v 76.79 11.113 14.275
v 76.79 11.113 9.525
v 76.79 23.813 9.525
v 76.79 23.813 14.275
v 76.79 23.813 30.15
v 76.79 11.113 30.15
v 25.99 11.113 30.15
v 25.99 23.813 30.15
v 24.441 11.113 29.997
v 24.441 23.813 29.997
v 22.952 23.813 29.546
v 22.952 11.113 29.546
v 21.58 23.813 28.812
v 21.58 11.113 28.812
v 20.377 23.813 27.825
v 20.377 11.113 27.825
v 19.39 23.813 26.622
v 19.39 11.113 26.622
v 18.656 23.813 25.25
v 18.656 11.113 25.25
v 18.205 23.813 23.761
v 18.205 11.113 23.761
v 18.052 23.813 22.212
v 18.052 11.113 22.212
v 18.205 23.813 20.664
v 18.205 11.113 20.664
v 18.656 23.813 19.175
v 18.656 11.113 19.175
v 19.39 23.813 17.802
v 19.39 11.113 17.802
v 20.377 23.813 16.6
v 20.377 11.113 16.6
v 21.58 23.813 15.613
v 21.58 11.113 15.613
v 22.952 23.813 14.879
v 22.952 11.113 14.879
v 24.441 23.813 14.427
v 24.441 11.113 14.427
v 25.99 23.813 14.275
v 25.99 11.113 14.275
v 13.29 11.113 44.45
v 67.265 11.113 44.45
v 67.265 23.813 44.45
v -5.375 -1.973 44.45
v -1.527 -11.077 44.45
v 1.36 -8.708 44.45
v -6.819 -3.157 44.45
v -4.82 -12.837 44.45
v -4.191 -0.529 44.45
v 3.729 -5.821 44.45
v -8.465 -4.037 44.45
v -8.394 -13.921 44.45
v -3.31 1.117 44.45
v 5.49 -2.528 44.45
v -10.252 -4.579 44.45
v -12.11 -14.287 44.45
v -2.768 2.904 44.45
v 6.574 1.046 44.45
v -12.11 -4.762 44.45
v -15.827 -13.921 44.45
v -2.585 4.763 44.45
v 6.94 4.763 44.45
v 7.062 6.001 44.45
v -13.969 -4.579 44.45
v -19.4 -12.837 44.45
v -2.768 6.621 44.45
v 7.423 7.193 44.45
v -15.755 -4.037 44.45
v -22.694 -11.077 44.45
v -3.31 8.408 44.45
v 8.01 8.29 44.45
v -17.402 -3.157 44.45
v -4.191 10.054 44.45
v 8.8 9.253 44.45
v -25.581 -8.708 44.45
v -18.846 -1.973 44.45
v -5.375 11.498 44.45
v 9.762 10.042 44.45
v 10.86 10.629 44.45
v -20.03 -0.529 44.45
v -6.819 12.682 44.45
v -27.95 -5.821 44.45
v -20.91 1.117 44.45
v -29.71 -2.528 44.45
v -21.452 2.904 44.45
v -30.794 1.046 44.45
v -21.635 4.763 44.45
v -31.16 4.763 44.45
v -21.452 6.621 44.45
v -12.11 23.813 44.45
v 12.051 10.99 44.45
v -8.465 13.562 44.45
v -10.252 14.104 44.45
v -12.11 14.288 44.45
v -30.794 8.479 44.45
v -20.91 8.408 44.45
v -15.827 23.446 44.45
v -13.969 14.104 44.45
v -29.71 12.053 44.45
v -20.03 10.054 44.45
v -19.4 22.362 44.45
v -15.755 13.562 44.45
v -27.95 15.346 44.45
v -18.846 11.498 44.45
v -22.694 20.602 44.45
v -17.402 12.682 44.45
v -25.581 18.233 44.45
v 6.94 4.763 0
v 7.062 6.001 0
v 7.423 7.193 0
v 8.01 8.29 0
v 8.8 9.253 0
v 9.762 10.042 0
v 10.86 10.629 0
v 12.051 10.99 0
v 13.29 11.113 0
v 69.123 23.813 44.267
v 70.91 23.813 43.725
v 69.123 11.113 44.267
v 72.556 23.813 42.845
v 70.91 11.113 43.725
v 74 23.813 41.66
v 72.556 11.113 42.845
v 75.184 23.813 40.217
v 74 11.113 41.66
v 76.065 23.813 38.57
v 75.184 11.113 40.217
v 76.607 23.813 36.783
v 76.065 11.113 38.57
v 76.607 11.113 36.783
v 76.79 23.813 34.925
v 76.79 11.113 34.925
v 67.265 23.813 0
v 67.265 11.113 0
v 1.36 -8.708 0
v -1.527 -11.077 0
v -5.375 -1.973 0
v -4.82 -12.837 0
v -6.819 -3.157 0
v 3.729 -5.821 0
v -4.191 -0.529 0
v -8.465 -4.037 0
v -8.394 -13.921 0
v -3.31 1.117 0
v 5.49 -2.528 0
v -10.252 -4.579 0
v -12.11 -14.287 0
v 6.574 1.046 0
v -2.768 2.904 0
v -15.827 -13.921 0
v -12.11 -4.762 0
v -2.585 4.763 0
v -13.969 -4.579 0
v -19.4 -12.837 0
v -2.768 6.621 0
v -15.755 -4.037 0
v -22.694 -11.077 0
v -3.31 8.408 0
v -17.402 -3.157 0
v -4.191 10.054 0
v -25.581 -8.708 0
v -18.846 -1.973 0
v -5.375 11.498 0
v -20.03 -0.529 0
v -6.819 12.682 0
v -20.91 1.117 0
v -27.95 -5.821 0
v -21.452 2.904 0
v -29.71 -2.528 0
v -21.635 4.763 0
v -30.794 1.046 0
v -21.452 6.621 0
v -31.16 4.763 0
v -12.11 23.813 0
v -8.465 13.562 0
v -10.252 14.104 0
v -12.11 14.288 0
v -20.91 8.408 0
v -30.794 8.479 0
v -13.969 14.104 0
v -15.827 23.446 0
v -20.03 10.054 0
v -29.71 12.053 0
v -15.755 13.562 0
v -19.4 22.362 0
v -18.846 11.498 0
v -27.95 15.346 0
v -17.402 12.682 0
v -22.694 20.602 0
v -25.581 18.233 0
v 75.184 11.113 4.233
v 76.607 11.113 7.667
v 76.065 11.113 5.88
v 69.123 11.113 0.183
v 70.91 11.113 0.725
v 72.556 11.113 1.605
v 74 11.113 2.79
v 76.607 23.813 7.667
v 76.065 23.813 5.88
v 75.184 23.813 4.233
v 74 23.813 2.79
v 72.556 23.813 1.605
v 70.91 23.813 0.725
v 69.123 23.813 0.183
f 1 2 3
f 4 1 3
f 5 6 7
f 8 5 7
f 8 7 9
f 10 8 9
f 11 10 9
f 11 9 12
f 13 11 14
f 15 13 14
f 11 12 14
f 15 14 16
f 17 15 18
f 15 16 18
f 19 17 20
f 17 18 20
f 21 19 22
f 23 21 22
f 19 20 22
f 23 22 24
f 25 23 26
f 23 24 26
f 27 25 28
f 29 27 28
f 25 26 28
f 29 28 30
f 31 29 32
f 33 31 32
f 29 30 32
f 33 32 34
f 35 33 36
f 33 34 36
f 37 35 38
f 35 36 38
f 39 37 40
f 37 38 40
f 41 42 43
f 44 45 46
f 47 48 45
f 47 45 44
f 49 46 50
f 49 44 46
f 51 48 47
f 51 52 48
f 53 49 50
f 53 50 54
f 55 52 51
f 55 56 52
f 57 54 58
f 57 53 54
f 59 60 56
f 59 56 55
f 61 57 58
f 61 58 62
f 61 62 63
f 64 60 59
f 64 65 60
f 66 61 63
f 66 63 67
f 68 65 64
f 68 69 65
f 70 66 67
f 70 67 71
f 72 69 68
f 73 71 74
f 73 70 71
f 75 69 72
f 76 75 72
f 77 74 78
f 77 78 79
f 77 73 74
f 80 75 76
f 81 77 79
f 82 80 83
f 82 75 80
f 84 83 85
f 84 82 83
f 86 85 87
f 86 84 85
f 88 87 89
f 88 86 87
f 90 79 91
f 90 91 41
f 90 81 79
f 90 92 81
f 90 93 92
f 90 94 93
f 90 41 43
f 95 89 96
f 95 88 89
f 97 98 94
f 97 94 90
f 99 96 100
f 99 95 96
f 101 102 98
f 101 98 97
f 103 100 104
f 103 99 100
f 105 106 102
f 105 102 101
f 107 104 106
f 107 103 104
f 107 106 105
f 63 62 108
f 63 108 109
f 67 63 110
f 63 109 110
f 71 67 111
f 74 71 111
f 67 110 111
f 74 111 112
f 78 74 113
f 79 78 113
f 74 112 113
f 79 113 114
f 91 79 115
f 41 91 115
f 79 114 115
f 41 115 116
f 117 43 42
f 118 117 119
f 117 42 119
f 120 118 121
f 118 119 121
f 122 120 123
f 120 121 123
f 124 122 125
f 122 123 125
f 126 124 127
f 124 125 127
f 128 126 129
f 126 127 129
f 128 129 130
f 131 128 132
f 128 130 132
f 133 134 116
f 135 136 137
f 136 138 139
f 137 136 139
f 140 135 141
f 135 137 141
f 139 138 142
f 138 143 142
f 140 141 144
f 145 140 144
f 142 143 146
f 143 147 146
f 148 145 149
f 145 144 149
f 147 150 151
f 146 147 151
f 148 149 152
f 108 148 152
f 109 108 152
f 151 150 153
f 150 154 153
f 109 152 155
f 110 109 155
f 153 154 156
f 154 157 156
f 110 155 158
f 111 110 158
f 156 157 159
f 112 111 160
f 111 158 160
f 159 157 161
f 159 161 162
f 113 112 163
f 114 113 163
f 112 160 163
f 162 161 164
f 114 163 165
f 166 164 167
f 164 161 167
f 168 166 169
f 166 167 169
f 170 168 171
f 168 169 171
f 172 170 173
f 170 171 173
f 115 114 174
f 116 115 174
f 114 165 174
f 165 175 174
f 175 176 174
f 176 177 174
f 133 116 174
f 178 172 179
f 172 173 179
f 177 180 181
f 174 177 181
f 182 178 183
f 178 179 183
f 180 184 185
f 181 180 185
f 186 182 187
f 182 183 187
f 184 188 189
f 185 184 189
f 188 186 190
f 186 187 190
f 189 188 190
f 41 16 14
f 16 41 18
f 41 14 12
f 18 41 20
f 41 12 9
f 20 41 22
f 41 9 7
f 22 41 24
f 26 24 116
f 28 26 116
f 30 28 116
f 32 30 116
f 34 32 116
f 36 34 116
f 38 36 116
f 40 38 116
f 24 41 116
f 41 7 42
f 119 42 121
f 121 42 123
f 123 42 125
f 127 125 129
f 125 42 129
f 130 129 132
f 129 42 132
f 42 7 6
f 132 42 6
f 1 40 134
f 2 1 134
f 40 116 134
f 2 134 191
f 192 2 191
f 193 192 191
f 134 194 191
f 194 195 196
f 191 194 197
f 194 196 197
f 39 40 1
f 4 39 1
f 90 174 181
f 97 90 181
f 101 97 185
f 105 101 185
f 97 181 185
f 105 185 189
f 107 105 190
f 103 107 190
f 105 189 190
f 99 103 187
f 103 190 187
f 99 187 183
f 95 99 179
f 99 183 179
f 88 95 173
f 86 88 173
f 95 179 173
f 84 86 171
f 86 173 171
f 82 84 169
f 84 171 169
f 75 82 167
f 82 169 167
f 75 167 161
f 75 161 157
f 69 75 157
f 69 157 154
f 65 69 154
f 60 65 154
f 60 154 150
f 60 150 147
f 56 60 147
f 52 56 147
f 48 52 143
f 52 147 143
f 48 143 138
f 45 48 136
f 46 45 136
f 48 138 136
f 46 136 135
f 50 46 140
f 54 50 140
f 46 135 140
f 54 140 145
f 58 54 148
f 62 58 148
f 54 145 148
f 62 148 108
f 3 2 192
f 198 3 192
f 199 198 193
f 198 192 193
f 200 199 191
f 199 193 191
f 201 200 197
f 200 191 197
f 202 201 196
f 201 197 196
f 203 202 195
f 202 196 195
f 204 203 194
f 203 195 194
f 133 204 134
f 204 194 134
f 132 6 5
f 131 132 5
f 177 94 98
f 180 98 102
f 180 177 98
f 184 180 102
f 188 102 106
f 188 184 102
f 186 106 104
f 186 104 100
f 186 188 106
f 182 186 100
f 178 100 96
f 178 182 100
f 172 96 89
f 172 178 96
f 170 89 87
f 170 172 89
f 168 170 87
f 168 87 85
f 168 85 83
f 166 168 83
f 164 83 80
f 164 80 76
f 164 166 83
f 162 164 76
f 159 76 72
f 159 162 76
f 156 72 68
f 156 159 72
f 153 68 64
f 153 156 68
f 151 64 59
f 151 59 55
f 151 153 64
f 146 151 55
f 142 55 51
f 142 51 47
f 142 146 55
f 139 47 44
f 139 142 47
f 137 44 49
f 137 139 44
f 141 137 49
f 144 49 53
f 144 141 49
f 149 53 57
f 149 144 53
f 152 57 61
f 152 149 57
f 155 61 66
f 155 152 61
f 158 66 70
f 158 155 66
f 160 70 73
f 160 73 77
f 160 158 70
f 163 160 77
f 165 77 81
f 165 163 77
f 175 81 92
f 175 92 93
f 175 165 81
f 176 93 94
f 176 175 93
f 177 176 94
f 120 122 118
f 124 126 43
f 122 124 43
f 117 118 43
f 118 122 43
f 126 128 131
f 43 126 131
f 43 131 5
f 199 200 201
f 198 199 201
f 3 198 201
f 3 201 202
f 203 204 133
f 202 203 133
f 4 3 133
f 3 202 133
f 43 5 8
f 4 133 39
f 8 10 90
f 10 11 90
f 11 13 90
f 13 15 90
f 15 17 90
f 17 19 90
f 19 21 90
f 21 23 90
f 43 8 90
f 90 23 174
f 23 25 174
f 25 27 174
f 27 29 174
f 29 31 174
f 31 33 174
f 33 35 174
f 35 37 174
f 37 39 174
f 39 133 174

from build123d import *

# Parameters (mm, degrees)
F0_R     = 9.525
F1_DEPTH = 44.45
F3_DEPTH = 25.4
F4_ANGLE = -90


with BuildPart() as f1:
    # F0 (on Top) → F1 (new body)
    with BuildSketch(Plane.XY):
        with BuildLine():
            Line((-12.1103564769, -65.08749924), (-12.1103564769, 23.81250076))
            ThreePointArc((-12.1103564769, 23.81250076), (-44.6307406585, 37.2828849416), (-31.1603564769, 4.76250076))
            ThreePointArc((-31.1603564769, 4.76250076), (-26.6702284164, 2.9026288205), (-24.8103564769, -1.58749924))
            Line((-24.8103564769, -1.58749924), (-24.8103564769, -65.08749924))
            Line((-24.8103564769, -65.08749924), (-12.1103564769, -65.08749924))
        make_face()
        with Locations((-31.1603564769, 23.81250076)):
            Circle(F0_R, mode=Mode.SUBTRACT)
    extrude(amount=F1_DEPTH)

    # F2 (on face) → F3 (cut)
    with BuildSketch(Plane(origin=(-24.8103564769, 0, 0), x_dir=(0, -1, 0), z_dir=(-1, 0, 0))):
        with BuildLine():
            Line((14.28749924, 14.2748), (65.08749924, 14.2748))
            Line((65.08749924, 14.2748), (65.08749924, 30.1498))
            Line((65.08749924, 30.1498), (14.28749924, 30.1498))
            ThreePointArc((14.28749924, 30.1498), (6.34999924, 22.2123), (14.28749924, 14.2748))
        make_face()
        with BuildLine():
            Line((65.08749924, 44.45), (55.56249924, 44.45))
            ThreePointArc((55.56249924, 44.45), (62.2976913308, 41.6601920908), (65.08749924, 34.925))
            Line((65.08749924, 34.925), (65.08749924, 44.45))
        make_face()
        with BuildLine():
            ThreePointArc((65.08749924, 9.525), (62.2976913308, 2.7898079092), (55.56249924, 0))
            Line((55.56249924, 0), (65.08749924, 0))
            Line((65.08749924, 0), (65.08749924, 9.525))
        make_face()
    extrude(amount=-F3_DEPTH, mode=Mode.SUBTRACT)


with BuildPart() as f1_1:
    # F4: moved
    add(f1.part.rotate(Axis((-12.1103564769, 23.81250076, 22.225), (0, 0, -1)), F4_ANGLE))


solid = f1_1.part
